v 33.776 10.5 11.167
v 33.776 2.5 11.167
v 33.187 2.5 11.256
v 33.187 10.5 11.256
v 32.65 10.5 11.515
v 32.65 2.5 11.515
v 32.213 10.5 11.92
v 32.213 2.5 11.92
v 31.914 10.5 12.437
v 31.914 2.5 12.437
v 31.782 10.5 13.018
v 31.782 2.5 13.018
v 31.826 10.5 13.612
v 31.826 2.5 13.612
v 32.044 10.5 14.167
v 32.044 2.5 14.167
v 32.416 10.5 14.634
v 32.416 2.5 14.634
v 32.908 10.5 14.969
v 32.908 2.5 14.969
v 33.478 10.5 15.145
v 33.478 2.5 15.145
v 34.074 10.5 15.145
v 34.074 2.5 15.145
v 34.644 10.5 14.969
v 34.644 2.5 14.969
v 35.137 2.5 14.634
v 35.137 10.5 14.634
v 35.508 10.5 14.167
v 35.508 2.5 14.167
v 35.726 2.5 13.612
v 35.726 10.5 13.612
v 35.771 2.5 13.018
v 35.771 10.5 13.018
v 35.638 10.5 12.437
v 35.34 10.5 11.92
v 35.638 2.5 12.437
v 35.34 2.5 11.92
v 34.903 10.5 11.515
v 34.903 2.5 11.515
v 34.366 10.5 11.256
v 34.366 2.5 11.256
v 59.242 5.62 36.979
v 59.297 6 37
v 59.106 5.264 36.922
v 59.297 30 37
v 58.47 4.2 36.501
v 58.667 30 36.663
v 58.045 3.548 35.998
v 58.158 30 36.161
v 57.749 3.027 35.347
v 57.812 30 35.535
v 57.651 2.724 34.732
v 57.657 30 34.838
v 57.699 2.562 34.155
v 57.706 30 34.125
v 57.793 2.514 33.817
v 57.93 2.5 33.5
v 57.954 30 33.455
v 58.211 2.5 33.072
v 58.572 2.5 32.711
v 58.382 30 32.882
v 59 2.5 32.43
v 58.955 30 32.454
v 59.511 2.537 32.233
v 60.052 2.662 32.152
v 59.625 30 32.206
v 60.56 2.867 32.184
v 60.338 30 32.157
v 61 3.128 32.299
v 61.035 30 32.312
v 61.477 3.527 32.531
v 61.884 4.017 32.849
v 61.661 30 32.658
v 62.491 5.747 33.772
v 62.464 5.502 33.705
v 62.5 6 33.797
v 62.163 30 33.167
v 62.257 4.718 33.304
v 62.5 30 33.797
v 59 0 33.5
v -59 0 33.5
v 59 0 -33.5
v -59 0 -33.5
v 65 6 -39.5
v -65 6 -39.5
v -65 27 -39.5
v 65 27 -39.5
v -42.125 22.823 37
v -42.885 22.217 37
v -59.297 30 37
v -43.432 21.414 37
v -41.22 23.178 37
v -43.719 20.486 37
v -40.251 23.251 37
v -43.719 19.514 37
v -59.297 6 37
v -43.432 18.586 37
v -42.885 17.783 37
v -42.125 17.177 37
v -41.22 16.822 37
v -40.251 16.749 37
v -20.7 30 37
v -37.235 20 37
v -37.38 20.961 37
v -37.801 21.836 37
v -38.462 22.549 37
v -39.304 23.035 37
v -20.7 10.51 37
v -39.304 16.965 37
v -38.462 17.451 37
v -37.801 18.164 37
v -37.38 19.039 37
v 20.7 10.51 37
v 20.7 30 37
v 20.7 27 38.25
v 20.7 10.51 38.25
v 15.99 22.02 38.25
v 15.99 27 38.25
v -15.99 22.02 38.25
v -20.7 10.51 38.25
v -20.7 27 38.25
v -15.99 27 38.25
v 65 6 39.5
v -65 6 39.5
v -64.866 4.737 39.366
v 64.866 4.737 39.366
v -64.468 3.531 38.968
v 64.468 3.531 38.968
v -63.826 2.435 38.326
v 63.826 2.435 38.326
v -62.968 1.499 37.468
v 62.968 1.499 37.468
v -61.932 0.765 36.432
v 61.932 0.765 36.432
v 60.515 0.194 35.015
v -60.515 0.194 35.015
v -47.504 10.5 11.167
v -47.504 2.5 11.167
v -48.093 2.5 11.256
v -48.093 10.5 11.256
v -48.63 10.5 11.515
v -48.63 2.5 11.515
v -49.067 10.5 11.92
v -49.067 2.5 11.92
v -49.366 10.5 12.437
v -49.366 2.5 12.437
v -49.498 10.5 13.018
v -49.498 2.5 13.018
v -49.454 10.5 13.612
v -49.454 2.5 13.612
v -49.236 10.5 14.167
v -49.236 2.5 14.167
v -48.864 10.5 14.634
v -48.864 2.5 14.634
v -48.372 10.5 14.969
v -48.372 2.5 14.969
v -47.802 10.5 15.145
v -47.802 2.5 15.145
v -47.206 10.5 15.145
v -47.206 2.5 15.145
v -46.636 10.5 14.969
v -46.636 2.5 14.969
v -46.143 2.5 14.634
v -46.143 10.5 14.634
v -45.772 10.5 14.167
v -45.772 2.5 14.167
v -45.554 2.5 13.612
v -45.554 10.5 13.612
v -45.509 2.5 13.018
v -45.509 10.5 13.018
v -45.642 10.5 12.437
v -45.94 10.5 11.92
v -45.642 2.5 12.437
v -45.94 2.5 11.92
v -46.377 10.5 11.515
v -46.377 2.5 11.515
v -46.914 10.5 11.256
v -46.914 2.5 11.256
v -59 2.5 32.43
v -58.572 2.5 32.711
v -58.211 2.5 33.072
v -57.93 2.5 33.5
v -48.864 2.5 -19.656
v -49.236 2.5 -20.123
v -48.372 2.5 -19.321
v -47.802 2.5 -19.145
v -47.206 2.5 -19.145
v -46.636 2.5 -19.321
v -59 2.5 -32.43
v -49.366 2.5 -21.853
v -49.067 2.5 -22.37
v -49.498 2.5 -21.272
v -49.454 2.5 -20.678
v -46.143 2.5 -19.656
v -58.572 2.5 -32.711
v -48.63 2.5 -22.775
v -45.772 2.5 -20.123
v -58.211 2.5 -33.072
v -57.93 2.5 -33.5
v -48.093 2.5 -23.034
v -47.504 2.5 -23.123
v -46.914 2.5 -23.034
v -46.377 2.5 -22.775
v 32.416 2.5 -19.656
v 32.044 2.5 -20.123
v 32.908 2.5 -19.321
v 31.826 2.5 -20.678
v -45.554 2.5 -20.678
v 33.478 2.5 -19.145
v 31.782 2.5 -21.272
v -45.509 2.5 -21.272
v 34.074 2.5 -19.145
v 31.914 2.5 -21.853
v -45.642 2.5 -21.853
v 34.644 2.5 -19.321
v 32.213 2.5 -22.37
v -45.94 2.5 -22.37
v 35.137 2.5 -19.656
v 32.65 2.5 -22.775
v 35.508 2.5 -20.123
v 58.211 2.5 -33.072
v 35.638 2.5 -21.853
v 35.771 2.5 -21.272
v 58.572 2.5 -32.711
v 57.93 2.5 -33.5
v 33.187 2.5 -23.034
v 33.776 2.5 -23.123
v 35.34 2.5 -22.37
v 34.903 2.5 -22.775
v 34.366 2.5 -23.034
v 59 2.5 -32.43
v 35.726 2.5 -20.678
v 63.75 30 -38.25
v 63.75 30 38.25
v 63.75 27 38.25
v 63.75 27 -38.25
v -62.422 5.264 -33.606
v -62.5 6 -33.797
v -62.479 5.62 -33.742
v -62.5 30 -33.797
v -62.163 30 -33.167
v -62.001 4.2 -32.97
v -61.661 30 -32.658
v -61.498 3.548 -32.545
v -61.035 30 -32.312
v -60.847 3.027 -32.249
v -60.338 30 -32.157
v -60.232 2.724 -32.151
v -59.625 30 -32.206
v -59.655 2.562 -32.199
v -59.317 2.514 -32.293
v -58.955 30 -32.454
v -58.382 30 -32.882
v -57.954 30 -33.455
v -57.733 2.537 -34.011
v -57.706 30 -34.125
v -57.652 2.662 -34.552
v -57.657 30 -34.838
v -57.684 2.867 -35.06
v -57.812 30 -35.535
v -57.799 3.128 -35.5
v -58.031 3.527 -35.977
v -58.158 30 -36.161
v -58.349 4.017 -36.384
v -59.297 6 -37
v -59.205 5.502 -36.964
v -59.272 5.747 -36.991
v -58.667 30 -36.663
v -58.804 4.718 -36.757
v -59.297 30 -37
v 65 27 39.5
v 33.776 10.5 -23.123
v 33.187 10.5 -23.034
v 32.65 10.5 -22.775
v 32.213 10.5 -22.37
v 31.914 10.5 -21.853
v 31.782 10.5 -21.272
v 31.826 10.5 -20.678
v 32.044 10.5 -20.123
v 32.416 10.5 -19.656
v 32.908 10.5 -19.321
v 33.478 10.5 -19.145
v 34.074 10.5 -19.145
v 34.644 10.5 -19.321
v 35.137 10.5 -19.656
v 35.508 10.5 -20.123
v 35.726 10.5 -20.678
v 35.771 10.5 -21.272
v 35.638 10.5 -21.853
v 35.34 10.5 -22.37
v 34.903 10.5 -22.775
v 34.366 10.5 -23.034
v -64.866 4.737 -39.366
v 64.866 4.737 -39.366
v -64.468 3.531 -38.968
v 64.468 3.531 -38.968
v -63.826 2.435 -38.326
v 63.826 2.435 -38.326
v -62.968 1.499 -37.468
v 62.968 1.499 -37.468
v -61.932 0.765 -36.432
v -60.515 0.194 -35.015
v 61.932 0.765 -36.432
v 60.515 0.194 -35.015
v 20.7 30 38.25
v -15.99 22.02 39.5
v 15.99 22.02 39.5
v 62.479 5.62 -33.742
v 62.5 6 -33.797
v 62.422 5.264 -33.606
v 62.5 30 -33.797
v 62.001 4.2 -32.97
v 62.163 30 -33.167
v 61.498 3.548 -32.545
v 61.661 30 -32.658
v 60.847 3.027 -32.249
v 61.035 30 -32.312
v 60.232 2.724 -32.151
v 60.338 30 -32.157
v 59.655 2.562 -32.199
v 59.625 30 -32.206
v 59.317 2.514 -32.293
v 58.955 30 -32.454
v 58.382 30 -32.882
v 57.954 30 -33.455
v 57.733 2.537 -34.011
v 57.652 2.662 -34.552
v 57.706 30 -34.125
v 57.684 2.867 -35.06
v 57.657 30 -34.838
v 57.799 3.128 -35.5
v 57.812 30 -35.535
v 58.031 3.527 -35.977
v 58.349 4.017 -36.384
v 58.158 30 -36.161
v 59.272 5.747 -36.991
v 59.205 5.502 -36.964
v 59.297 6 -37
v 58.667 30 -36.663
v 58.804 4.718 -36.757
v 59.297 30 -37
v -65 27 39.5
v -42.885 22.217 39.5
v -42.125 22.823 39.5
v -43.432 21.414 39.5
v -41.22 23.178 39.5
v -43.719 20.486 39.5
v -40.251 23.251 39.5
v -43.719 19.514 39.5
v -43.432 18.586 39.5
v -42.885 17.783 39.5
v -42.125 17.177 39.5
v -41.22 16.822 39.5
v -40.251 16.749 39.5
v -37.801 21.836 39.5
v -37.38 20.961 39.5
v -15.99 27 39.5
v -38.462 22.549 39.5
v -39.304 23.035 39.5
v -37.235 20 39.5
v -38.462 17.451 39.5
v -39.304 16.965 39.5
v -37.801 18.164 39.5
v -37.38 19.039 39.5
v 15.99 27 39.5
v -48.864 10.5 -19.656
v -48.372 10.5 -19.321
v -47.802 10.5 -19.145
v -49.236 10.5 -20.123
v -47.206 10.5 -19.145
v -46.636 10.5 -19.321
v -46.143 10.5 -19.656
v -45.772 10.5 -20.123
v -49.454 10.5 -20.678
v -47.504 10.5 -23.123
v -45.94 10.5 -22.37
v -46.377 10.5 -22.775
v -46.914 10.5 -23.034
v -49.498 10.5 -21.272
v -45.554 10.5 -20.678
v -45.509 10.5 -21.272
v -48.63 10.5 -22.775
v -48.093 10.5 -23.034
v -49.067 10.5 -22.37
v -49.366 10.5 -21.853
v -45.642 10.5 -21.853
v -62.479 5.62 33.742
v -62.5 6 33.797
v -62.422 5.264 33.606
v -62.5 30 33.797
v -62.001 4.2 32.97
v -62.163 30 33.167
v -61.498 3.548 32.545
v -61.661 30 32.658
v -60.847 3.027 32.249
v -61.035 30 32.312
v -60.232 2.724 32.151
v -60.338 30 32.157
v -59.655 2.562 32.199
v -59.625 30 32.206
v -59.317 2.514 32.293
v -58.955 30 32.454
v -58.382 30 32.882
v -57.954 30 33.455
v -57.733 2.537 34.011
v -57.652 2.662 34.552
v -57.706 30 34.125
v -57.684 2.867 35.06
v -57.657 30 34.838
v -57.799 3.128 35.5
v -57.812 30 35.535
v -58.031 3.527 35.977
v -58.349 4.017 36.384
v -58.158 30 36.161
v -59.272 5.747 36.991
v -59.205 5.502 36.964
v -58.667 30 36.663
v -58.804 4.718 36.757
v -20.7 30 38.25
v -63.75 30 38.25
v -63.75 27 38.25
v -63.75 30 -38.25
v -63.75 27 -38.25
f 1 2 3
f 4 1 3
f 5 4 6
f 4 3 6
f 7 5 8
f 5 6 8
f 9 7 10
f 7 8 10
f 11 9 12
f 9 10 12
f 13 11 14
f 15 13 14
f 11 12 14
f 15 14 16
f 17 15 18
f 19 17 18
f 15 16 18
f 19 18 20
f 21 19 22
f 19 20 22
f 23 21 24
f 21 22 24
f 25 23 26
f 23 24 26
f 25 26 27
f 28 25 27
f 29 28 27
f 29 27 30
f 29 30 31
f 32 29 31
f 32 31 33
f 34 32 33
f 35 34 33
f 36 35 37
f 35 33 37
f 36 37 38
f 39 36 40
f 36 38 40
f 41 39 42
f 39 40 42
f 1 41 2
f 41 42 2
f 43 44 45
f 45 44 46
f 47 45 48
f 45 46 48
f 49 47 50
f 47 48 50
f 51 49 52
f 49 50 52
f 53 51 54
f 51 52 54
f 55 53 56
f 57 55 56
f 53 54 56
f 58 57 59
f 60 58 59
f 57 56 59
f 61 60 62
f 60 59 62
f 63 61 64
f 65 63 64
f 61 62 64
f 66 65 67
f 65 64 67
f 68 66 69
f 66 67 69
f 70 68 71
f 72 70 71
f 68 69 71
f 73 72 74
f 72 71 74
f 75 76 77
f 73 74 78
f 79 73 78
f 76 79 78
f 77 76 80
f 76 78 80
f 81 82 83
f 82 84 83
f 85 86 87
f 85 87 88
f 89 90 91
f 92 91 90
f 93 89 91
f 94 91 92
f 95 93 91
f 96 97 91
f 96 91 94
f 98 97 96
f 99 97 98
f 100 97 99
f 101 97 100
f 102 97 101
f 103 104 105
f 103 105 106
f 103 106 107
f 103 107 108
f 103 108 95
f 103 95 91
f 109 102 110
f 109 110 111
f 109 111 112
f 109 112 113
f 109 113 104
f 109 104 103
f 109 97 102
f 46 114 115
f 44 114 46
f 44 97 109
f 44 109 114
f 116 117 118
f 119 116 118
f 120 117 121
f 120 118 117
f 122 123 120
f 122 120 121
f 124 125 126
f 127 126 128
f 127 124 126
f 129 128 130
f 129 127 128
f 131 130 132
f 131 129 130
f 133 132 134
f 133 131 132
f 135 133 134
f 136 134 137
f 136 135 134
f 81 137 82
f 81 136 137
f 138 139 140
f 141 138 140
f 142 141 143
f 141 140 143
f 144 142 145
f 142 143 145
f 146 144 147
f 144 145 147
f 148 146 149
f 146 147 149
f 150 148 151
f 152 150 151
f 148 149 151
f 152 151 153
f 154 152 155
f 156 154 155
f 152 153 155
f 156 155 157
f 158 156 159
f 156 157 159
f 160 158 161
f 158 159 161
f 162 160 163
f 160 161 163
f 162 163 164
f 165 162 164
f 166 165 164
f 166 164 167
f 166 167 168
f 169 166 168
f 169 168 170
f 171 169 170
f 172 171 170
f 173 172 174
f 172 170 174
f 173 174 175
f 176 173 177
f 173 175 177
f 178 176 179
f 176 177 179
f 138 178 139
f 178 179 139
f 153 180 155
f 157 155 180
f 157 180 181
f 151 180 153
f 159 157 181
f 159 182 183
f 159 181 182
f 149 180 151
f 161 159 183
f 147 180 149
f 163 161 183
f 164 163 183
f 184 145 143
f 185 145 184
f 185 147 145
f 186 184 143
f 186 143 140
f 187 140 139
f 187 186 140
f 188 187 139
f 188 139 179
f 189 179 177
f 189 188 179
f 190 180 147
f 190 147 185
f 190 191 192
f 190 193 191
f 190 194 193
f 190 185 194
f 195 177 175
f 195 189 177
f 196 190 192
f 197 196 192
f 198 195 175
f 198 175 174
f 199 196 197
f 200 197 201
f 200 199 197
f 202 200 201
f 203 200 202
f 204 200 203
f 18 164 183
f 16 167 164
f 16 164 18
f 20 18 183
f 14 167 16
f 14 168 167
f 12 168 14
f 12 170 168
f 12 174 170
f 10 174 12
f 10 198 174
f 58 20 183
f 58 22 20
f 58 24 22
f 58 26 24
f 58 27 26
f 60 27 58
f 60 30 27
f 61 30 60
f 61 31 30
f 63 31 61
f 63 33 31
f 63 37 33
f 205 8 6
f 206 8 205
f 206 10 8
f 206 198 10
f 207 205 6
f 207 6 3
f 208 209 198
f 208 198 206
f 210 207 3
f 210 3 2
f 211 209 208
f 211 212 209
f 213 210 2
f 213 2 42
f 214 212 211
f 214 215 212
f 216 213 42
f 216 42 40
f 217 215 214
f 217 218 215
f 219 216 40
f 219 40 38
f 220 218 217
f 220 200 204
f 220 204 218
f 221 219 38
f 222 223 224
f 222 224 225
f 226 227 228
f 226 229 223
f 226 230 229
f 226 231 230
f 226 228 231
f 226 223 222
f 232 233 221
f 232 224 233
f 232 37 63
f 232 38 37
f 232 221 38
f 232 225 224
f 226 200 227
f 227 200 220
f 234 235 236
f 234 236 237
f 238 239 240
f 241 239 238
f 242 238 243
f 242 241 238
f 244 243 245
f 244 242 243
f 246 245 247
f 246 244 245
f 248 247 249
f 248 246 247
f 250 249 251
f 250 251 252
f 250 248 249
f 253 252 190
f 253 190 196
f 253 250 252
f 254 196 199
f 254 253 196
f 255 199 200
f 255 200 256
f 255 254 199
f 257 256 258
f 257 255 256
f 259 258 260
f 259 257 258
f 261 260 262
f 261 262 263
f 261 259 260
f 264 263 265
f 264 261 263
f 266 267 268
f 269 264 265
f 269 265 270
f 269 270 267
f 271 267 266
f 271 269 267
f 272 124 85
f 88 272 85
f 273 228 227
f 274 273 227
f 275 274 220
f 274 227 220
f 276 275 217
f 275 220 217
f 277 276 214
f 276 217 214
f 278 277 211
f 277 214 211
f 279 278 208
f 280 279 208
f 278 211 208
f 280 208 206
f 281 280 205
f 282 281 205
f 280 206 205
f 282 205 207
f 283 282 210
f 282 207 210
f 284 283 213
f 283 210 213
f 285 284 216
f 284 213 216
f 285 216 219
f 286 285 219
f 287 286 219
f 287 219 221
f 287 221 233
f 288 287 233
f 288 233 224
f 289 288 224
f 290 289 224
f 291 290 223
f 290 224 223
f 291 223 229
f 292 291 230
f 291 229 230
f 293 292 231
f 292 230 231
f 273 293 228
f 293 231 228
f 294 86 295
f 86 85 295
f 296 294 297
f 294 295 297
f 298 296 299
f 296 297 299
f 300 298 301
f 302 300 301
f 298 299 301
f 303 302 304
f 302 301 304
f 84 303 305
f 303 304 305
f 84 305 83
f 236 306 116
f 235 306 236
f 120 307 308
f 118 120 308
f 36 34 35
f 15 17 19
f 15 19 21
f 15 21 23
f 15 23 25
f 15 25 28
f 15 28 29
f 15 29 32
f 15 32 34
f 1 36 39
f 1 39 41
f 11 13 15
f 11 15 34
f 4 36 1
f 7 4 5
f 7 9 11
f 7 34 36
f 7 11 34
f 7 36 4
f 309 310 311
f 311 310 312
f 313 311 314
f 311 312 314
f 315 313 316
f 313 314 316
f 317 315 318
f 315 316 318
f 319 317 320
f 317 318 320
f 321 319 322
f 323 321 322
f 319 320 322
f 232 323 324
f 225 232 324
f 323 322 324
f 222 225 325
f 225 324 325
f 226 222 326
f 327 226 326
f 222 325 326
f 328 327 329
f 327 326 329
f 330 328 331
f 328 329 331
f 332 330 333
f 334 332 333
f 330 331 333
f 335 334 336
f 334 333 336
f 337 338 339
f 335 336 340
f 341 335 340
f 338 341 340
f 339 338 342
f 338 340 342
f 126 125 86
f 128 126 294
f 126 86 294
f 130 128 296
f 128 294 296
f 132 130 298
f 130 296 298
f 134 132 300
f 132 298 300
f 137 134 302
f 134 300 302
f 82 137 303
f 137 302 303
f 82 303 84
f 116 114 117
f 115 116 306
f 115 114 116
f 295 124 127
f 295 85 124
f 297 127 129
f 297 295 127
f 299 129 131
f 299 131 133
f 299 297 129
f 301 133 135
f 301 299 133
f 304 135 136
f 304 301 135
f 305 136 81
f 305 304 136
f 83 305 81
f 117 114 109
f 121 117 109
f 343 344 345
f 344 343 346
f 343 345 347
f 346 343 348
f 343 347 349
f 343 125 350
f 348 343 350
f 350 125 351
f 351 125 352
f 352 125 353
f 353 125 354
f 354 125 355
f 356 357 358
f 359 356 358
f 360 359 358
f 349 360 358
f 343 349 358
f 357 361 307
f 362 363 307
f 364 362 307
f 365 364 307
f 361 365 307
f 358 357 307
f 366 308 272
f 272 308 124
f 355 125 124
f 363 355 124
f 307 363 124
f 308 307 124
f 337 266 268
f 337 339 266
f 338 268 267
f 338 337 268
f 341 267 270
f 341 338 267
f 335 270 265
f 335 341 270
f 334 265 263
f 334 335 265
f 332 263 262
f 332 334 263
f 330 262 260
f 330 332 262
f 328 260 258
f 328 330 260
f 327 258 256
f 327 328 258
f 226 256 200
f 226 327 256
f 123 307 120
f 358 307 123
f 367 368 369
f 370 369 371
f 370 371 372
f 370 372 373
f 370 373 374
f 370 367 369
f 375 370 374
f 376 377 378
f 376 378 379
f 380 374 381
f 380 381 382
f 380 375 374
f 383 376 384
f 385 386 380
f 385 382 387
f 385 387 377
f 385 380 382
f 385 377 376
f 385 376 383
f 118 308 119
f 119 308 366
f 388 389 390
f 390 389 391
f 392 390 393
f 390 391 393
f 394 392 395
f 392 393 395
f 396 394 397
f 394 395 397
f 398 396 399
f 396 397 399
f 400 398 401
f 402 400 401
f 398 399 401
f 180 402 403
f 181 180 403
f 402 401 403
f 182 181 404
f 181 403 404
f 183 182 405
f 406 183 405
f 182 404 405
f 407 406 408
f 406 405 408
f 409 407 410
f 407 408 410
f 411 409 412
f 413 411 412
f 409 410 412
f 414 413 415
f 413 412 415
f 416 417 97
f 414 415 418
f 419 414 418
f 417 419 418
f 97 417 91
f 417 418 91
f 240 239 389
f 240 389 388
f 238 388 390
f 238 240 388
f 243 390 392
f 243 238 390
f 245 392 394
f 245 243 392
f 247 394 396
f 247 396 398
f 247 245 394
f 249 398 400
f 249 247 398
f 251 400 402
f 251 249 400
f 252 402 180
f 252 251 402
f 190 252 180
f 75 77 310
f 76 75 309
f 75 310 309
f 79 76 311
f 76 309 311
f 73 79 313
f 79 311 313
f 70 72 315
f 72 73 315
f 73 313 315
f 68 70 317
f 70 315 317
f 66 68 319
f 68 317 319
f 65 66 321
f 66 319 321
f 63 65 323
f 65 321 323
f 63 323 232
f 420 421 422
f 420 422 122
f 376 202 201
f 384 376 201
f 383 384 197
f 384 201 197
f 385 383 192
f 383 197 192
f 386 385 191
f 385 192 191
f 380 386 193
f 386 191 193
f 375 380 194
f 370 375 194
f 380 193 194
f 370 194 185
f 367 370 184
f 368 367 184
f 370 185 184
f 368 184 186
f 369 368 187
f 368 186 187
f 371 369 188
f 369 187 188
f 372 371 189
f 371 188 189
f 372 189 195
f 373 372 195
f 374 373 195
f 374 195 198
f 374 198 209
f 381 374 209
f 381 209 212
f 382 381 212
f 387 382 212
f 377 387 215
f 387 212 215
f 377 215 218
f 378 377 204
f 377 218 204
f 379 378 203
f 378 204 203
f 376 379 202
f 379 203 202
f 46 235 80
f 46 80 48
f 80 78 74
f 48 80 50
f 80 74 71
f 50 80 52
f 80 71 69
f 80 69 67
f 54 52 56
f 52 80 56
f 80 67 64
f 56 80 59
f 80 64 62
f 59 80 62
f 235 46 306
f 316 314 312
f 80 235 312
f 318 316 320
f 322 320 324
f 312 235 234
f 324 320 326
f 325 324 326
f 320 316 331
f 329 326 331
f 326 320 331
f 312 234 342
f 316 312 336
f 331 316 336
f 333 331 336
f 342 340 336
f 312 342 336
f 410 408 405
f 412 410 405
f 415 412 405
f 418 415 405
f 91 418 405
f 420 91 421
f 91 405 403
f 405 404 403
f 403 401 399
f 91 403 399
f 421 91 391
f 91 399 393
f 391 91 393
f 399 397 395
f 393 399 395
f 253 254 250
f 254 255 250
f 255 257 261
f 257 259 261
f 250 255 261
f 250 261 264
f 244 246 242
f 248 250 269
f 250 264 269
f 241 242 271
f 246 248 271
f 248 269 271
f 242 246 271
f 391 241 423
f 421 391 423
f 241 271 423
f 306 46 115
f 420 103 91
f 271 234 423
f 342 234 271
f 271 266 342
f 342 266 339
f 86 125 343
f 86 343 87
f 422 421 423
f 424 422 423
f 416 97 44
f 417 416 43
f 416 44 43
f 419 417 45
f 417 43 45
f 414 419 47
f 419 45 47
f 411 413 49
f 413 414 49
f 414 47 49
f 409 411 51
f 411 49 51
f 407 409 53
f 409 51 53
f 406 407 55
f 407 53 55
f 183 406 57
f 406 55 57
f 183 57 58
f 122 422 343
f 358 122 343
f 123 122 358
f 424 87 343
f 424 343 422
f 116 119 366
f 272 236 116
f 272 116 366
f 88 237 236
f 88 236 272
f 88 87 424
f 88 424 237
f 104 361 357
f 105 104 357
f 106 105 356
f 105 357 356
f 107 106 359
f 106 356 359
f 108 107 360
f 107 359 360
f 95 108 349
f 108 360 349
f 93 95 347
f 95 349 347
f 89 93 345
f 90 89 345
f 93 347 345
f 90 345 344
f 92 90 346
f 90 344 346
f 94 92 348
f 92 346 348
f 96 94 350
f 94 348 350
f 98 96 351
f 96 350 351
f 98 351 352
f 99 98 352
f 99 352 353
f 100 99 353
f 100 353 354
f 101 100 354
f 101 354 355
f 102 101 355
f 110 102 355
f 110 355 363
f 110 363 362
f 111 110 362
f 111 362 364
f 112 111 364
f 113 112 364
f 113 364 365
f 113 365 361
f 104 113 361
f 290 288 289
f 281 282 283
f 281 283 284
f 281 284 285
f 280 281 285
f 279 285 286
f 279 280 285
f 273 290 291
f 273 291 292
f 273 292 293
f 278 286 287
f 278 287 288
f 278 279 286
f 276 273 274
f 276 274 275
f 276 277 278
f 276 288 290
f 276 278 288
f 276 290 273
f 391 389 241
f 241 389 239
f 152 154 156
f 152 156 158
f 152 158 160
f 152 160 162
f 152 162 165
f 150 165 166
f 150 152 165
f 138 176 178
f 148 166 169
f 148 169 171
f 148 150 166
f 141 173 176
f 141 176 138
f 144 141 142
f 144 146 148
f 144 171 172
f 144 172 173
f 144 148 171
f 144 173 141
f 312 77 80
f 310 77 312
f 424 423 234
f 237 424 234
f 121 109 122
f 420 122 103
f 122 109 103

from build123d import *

# Parameters (mm, degrees)
SKETCH1_W           = 130
SKETCH1_H           = 79
BOSS_EXTRUDE1_DEPTH = 30
FILLET1_R           = 6
SHELL1_T            = -2.5
SKETCH2_W           = 130
SKETCH2_H           = 79
SKETCH2_W_2         = 127.5
SKETCH2_H_2         = 76.5
CUT_EXTRUDE1_DEPTH  = 3
SKETCH3_R           = 2
BOSS_EXTRUDE2_DEPTH = 8
BOSS_EXTRUDE3_REACH = 83.763
CUT_EXTRUDE2_REACH  = 108.611
SKETCH5_W           = 31.98
SKETCH5_H           = 7.98
SKETCH6_W           = 41.4
SKETCH6_H           = 24.3
CUT_EXTRUDE3_DEPTH  = 1.25
CUT_EXTRUDE4_REACH  = 108.611
SKETCH7_R           = 3.26


with BuildPart() as part:
    # Sketch1 → Boss-Extrude1 (new body)
    with BuildSketch(Plane(origin=(0, 0, 0), x_dir=(1, 0, 0), z_dir=(0, 1, 0))):
        Rectangle(SKETCH1_W, SKETCH1_H)
    extrude(amount=BOSS_EXTRUDE1_DEPTH)

    # Fillet1
    fillet1_edges = [part.edges().sort_by_distance(p)[0] for p in [
        (0, 0, 39.5),
        (-65, 0, 0),
        (0, 0, -39.5),
        (65, 0, 0),
    ]]
    fillet(fillet1_edges, radius=FILLET1_R)

    # Shell1
    shell1_openings = [part.faces().sort_by_distance(p)[0] for p in [
        (0, 30, 0),
    ]]
    offset(amount=SHELL1_T, openings=shell1_openings)

    # Sketch2 → Cut-Extrude1 (cut)
    with BuildSketch(Plane(origin=(0, 30, 0), x_dir=(1, 0, 0), z_dir=(0, 1, 0))):
        Rectangle(SKETCH2_W, SKETCH2_H)
        Rectangle(SKETCH2_W_2, SKETCH2_H_2, mode=Mode.SUBTRACT)
    extrude(amount=-CUT_EXTRUDE1_DEPTH, mode=Mode.SUBTRACT)

    # Sketch3 → Boss-Extrude2 (add)
    with BuildSketch(Plane(origin=(0, 2.5, 0), x_dir=(1, 0, 0), z_dir=(0, 1, 0))):
        with Locations(Location((-47.503765377, 21.122596556, 0), (0, 0, 90))):
            Circle(SKETCH3_R)
        with Locations(Location((33.776234623, 21.122596556, 0), (0, 0, 90))):
            Circle(SKETCH3_R)
        with Locations(Location((-47.503765377, -13.167403444, 0), (0, 0, 90))):
            Circle(SKETCH3_R)
        with Locations(Location((33.776234623, -13.167403444, 0), (0, 0, 90))):
            Circle(SKETCH3_R)
    extrude(amount=BOSS_EXTRUDE2_DEPTH)

    # Sketch4 → Boss-Extrude3 (add, up to next)
    with BuildSketch(Plane(origin=(0, 30, 0), x_dir=(1, 0, 0), z_dir=(0, 1, 0)), mode=Mode.PRIVATE) as boss_extrude3_sk1:
        with BuildLine():
            Line((-62.5, 37), (-62.5, 35.502936105))
            ThreePointArc((-62.5, 35.502936105), (-58.382233047, 32.882233047), (-61.002936105, 37))
            Line((-61.002936105, 37), (-62.5, 37))
        make_face()
    boss_extrude3_tool1 = extrude(boss_extrude3_sk1.sketch, amount=-BOSS_EXTRUDE3_REACH, mode=Mode.PRIVATE) - part.part
    # Sketch4 → Boss-Extrude3 (add, up to next)
    with BuildSketch(Plane(origin=(0, 30, 0), x_dir=(1, 0, 0), z_dir=(0, 1, 0)), mode=Mode.PRIVATE) as boss_extrude3_sk2:
        with BuildLine():
            Line((62.5, 37), (62.5, 35.502936105))
            ThreePointArc((62.5, 35.502936105), (58.382233047, 32.882233047), (61.002936105, 37))
            Line((61.002936105, 37), (62.5, 37))
        make_face()
    boss_extrude3_tool2 = extrude(boss_extrude3_sk2.sketch, amount=-BOSS_EXTRUDE3_REACH, mode=Mode.PRIVATE) - part.part
    # Sketch4 → Boss-Extrude3 (add, up to next)
    with BuildSketch(Plane(origin=(0, 30, 0), x_dir=(1, 0, 0), z_dir=(0, 1, 0)), mode=Mode.PRIVATE) as boss_extrude3_sk3:
        with BuildLine():
            Line((-62.5, -37), (-62.5, -35.502936105))
            ThreePointArc((-62.5, -35.502936105), (-58.382233047, -32.882233047), (-61.002936105, -37))
            Line((-61.002936105, -37), (-62.5, -37))
        make_face()
    boss_extrude3_tool3 = extrude(boss_extrude3_sk3.sketch, amount=-BOSS_EXTRUDE3_REACH, mode=Mode.PRIVATE) - part.part
    # Sketch4 → Boss-Extrude3 (add, up to next)
    with BuildSketch(Plane(origin=(0, 30, 0), x_dir=(1, 0, 0), z_dir=(0, 1, 0)), mode=Mode.PRIVATE) as boss_extrude3_sk4:
        with BuildLine():
            Line((62.5, -37), (61.002936105, -37))
            ThreePointArc((61.002936105, -37), (58.382233047, -32.882233047), (62.5, -35.502936105))
            Line((62.5, -35.502936105), (62.5, -37))
        make_face()
    boss_extrude3_tool4 = extrude(boss_extrude3_sk4.sketch, amount=-BOSS_EXTRUDE3_REACH, mode=Mode.PRIVATE) - part.part
    add(boss_extrude3_tool1.solids().sort_by_distance((-60.224191, 30, -34.724191))[0])
    add(boss_extrude3_tool2.solids().sort_by_distance((60.224191, 30, -34.724191))[0])
    add(boss_extrude3_tool3.solids().sort_by_distance((-60.224191, 30, 34.724191))[0])
    add(boss_extrude3_tool4.solids().sort_by_distance((60.224191, 30, 34.724191))[0])

    # Cut-Extrude2: up to this face of the body (flat: up to its plane)
    cut_extrude2_end = Plane(part.part.faces().sort_by_distance((0, 18, 37))[0])
    # Sketch5 → Cut-Extrude2 (cut, up to the picked face)
    with BuildSketch(Plane.XY.offset(39.5), mode=Mode.PRIVATE) as cut_extrude2_sk1:
        with Locations((0, 26.01)):
            Rectangle(SKETCH5_W, SKETCH5_H)
    cut_extrude2_tool1 = split(extrude(cut_extrude2_sk1.sketch, amount=-CUT_EXTRUDE2_REACH, mode=Mode.PRIVATE), bisect_by=cut_extrude2_end, keep=Keep.BOTH, mode=Mode.PRIVATE)
    add(cut_extrude2_tool1.solids().sort_by(Axis((0, 26.01, 39.5), (0, 0, -1)))[0], mode=Mode.SUBTRACT)

    # Sketch6 → Cut-Extrude3 (cut)
    with BuildSketch(Plane(origin=(0, 0, 37), x_dir=(-1, 0, 0), z_dir=(0, 0, -1))):
        with Locations((0, 22.66)):
            Rectangle(SKETCH6_W, SKETCH6_H)
    extrude(amount=-CUT_EXTRUDE3_DEPTH, mode=Mode.SUBTRACT)

    # Sketch7 → Cut-Extrude4 (cut, up to next)
    with BuildSketch(Plane.XY.offset(39.5), mode=Mode.PRIVATE) as cut_extrude4_sk1:
        with Locations((-40.495, 20)):
            Circle(SKETCH7_R)
    cut_extrude4_tool1 = extrude(cut_extrude4_sk1.sketch, amount=-CUT_EXTRUDE4_REACH, mode=Mode.PRIVATE) & part.part
    add(cut_extrude4_tool1.solids().sort_by_distance((-40.495, 20, 39.5))[0], mode=Mode.SUBTRACT)


solid = part.part
